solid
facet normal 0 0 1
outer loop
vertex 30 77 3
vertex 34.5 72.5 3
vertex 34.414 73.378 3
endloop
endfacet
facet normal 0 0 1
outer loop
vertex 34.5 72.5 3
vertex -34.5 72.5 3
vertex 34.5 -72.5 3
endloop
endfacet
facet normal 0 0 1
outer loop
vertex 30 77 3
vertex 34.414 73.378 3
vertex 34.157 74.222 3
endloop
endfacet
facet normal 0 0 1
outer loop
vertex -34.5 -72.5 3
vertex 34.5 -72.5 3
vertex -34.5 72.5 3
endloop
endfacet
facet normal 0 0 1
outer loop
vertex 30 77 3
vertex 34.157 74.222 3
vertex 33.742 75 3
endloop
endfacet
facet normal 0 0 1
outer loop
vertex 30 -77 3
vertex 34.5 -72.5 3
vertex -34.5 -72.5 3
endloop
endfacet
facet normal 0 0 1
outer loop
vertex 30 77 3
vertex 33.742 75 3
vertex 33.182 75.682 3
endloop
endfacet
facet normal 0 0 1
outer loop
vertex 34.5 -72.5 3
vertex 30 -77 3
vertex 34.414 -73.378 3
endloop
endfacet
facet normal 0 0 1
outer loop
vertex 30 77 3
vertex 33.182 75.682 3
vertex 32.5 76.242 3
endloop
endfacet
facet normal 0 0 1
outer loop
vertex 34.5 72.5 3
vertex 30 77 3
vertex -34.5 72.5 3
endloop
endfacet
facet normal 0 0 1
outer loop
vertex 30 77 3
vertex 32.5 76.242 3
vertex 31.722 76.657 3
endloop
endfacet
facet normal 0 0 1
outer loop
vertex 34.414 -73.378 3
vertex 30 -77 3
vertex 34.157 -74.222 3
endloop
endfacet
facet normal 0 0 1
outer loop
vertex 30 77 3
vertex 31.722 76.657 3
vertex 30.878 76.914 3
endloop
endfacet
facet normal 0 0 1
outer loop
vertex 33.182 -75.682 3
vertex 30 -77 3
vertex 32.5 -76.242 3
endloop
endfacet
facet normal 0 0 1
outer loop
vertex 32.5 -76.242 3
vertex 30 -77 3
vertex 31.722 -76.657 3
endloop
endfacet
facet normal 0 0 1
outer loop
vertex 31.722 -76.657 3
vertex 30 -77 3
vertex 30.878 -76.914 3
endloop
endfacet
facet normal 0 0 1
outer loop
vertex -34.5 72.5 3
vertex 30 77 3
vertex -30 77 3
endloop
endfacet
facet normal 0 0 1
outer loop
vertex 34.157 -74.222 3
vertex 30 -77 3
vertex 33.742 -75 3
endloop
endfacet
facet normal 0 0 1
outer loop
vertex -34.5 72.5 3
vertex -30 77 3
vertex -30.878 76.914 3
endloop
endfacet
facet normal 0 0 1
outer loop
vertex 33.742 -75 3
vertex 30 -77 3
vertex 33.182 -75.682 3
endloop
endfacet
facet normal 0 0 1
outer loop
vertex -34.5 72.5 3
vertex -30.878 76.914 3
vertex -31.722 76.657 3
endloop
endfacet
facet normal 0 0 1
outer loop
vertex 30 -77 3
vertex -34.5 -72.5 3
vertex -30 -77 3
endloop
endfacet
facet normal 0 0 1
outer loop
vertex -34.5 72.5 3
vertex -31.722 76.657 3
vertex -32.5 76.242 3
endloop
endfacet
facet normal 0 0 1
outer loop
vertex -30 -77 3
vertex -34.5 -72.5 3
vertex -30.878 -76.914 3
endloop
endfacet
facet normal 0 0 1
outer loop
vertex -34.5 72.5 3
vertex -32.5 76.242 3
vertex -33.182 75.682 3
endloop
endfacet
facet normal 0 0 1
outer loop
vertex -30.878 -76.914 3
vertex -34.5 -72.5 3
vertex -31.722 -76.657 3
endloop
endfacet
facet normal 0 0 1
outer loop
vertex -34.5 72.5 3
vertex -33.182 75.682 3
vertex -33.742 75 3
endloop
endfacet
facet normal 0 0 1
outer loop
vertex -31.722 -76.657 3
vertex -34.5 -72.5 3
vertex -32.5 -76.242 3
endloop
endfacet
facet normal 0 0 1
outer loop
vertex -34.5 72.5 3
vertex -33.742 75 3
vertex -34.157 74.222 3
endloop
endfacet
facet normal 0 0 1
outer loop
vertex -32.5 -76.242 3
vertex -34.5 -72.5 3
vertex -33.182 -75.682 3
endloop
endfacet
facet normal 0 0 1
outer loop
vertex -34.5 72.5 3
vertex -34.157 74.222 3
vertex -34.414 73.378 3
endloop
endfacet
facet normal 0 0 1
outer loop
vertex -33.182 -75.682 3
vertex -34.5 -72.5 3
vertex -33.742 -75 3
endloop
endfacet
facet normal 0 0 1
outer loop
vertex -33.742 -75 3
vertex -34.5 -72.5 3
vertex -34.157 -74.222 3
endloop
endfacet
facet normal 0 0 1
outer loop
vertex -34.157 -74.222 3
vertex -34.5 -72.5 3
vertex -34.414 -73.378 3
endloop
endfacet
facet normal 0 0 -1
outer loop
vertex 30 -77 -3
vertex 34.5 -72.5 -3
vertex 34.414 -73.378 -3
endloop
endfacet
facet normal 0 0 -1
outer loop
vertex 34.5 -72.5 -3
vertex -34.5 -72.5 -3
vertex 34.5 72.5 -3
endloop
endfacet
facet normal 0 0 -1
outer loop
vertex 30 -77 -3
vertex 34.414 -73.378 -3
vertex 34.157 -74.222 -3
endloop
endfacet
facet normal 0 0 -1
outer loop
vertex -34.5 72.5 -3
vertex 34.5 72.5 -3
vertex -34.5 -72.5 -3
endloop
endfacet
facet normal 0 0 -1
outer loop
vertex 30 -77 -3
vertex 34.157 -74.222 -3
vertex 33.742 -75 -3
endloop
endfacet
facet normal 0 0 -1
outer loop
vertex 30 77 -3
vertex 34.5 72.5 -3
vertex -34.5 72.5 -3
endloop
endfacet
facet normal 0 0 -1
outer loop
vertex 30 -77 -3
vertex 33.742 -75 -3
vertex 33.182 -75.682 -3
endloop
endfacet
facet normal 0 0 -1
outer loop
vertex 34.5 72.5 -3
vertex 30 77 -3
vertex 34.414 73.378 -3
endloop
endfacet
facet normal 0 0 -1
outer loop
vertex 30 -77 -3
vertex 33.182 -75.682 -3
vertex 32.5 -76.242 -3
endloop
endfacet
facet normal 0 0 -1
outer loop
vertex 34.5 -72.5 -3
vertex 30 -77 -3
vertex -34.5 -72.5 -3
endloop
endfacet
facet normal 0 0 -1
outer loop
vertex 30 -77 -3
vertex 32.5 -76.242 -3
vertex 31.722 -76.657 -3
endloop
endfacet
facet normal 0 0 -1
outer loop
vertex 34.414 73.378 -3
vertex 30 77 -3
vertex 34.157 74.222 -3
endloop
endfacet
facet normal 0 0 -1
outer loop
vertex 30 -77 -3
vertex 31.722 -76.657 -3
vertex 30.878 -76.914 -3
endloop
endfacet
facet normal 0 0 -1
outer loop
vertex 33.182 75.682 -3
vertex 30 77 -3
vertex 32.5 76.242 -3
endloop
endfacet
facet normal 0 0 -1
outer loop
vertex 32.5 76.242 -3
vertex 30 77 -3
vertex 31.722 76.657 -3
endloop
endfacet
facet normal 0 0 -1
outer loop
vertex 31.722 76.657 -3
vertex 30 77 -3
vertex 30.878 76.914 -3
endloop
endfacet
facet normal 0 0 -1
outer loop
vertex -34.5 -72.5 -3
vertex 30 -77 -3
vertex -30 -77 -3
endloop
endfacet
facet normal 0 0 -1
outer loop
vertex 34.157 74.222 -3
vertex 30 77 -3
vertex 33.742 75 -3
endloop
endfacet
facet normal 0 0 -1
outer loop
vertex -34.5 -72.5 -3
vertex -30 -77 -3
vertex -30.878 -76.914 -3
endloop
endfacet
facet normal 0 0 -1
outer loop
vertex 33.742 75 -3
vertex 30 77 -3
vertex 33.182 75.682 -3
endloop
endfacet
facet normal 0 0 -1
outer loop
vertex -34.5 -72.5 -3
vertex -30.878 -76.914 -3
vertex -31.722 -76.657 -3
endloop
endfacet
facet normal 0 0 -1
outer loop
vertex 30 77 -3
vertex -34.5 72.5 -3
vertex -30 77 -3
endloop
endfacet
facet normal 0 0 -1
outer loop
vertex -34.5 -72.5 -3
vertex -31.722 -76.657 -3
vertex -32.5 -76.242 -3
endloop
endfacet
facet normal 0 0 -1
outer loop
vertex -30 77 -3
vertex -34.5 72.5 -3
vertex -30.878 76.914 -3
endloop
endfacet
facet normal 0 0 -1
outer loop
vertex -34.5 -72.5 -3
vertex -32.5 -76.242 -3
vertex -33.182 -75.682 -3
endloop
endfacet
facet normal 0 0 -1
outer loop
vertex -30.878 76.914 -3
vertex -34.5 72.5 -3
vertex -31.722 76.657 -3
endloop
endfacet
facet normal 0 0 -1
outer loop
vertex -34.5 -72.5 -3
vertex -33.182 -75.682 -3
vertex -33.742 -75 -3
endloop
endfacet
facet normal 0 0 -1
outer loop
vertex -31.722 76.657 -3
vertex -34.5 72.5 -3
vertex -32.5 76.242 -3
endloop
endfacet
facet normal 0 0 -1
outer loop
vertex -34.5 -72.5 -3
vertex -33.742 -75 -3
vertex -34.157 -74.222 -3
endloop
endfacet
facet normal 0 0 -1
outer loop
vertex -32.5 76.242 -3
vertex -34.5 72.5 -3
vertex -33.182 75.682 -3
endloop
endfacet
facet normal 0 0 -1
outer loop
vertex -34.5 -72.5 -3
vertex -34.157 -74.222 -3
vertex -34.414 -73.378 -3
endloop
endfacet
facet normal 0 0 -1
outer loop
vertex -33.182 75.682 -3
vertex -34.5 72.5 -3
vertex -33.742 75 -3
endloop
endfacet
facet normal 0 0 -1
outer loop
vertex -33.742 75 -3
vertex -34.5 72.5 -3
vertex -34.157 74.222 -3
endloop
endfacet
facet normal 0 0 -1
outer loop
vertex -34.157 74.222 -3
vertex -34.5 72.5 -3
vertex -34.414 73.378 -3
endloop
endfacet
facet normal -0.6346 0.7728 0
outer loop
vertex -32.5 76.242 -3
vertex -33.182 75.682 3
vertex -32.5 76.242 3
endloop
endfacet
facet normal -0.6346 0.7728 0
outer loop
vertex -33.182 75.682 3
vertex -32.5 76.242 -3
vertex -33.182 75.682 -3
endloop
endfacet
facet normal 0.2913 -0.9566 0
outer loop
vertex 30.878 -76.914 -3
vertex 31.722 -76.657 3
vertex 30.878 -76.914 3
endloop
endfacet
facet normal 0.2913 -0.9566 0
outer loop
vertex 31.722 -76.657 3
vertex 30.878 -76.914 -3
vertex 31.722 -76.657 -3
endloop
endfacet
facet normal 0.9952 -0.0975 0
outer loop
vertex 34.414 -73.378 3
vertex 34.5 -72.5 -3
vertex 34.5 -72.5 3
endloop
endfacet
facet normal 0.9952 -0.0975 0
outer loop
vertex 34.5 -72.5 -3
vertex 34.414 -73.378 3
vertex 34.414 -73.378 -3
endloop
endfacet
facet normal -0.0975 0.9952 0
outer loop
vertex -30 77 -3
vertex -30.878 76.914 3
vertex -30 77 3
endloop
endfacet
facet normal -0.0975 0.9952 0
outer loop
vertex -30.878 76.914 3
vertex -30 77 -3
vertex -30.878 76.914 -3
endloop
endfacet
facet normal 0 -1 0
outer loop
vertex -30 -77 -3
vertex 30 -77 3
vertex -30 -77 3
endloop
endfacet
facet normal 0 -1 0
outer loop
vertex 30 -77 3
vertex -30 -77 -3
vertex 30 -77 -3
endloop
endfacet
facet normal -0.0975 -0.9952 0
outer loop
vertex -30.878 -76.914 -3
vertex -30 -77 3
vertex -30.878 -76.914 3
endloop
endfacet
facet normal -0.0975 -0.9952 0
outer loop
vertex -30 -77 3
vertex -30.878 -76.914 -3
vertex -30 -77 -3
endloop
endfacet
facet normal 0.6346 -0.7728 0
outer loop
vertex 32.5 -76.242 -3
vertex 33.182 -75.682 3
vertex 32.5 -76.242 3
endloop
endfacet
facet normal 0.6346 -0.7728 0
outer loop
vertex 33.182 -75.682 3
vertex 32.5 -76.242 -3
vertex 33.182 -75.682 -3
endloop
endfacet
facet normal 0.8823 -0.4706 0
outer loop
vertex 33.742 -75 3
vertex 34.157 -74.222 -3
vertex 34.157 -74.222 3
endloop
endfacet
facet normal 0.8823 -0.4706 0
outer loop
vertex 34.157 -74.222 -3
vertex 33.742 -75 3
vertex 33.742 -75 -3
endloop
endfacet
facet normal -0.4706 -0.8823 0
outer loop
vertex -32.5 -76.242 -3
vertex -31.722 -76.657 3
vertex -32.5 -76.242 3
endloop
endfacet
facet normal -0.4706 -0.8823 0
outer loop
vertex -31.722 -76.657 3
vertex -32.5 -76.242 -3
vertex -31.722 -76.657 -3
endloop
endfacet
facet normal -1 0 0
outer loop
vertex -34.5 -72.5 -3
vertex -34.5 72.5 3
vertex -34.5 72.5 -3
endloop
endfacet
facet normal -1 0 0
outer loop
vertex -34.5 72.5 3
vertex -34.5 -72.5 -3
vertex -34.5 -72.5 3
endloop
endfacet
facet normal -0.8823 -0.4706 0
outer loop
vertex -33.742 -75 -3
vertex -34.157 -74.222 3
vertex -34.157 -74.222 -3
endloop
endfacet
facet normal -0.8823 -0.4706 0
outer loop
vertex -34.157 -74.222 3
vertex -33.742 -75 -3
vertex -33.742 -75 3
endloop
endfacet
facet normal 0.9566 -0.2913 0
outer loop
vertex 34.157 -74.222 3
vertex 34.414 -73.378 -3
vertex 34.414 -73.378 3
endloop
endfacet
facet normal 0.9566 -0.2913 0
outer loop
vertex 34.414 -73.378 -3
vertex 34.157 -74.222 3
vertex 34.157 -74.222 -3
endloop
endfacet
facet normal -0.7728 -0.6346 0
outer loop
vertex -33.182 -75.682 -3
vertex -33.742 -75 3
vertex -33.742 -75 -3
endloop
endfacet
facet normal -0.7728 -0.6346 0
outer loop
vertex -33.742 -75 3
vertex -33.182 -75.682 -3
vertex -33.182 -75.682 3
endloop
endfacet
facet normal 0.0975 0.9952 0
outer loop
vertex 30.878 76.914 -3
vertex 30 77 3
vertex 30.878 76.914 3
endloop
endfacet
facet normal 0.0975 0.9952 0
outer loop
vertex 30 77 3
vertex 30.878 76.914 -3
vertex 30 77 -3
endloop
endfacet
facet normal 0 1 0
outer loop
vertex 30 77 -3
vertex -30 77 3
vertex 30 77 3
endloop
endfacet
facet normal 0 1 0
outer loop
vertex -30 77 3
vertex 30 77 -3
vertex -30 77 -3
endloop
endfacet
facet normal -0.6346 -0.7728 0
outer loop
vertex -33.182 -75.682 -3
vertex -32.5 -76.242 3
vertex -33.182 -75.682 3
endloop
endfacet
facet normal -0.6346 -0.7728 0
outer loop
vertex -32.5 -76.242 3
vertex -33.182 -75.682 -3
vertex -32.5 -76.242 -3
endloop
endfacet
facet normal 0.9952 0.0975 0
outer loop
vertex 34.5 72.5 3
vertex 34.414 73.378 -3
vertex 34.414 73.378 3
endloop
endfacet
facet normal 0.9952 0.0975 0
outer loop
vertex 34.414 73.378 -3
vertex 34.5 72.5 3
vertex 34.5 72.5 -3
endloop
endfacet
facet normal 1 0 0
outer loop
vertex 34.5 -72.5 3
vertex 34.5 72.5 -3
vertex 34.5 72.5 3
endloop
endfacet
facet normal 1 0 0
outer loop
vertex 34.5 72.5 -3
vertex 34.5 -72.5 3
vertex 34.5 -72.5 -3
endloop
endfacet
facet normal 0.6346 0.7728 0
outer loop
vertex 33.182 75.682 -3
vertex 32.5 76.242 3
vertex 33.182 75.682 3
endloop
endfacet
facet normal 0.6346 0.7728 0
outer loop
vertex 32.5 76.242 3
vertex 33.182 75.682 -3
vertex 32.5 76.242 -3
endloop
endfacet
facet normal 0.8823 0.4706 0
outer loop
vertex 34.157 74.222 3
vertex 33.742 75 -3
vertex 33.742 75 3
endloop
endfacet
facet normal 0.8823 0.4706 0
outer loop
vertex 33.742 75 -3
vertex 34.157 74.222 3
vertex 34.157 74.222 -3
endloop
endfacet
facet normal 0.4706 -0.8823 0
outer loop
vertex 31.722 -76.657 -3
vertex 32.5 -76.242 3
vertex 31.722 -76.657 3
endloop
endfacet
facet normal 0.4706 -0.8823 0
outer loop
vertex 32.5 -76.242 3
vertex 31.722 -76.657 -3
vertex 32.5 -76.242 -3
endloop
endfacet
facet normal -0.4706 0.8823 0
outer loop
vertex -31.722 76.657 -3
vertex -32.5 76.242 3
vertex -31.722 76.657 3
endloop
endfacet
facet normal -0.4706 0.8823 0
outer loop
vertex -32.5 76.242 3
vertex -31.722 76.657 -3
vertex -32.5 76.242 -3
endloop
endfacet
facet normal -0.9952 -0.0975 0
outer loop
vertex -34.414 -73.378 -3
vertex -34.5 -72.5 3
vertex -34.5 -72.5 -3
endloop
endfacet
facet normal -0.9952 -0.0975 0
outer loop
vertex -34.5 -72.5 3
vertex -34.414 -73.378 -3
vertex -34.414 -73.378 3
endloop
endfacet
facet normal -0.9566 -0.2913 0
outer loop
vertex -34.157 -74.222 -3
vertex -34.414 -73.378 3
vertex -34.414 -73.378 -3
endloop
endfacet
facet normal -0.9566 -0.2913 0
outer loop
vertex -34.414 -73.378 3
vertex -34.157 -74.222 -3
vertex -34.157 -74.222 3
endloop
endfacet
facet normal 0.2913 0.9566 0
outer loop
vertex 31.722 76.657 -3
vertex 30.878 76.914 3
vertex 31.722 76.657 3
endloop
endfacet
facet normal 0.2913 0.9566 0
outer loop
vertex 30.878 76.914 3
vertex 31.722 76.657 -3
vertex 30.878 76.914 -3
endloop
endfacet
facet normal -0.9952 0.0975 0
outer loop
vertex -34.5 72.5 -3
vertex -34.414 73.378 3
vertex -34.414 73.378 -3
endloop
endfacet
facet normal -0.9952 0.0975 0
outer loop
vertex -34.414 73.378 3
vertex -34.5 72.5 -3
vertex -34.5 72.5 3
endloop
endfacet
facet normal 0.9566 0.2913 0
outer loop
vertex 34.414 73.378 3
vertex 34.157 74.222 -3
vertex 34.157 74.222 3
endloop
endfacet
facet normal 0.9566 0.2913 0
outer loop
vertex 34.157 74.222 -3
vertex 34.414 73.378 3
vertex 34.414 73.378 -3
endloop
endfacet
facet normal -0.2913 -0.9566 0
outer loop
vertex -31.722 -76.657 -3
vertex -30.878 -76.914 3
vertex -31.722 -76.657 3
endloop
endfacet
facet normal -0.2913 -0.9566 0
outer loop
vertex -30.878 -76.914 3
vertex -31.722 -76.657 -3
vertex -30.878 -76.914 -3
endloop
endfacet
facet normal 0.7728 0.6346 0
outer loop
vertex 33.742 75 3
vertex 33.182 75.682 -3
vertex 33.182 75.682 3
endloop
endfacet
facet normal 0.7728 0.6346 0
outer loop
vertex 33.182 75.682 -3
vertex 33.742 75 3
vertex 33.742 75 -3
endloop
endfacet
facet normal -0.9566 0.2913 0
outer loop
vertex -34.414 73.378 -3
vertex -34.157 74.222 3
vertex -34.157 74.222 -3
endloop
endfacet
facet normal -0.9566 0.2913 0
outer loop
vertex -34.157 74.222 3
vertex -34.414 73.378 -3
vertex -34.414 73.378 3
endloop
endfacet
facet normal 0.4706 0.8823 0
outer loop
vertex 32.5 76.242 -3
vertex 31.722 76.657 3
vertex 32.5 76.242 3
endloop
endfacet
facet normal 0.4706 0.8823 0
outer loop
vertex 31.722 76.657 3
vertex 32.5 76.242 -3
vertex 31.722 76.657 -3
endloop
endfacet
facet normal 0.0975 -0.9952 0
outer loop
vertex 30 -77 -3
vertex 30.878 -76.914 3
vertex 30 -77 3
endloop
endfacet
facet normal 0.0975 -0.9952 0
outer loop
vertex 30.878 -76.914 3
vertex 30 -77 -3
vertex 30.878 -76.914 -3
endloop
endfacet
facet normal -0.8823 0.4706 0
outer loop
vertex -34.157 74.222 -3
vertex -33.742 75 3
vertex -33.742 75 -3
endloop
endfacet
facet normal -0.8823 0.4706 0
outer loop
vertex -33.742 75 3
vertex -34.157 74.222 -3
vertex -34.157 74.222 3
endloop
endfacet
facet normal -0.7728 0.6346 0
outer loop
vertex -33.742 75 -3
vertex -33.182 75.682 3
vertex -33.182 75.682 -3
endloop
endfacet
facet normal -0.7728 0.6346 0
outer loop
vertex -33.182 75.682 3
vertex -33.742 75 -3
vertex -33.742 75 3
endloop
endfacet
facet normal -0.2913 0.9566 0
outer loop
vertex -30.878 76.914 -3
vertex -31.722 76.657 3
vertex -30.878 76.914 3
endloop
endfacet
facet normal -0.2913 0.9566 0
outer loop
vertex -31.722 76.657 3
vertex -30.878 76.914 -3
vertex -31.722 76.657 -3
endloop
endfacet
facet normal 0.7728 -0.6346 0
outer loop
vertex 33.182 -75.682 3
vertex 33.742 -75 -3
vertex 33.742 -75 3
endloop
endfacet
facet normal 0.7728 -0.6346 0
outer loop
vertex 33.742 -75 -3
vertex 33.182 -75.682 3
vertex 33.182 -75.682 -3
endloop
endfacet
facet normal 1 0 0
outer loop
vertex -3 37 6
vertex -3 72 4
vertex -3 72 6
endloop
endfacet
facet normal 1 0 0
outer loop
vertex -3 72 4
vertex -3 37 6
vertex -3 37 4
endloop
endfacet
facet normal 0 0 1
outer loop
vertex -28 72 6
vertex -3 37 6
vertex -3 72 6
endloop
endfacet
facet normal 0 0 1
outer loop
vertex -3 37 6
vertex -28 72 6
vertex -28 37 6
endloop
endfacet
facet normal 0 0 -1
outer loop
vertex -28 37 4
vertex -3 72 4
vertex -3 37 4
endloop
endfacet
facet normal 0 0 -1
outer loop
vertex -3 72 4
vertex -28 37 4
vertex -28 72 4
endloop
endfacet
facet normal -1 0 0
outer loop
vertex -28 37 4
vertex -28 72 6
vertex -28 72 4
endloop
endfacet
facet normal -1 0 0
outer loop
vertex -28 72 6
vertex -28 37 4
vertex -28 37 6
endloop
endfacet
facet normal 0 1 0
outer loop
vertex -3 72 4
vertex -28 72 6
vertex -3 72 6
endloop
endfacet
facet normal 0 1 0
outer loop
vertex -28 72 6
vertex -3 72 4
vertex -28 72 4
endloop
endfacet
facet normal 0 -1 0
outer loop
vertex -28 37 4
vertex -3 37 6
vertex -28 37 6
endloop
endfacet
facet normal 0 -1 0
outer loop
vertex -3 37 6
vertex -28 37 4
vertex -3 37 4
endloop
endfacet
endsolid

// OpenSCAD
echo("Работа Павла Семенова");
len_phone = 145;
width_phone = 60;
thickness_phone = 6;
cube([width_phone, len_phone, thickness_phone], center=true);

hull() {
    color("red")
    translate([width_phone/2, len_phone/2, 0])
    cylinder(h=thickness_phone, d=8, $fn=32, center=true);

    mirror([1,0,0])
    color("red")
    translate([width_phone/2, len_phone/2, 0])
    cylinder(h=thickness_phone, d=8, $fn=32, center=true);

    mirror([0,1,0])
    color("red")
    translate([width_phone/2, len_phone/2, 0])
    cylinder(h=thickness_phone, d=8, $fn=32, center=true);

    mirror([1,0,0])
    mirror([0,1,0])
    color("red")
    translate([width_phone/2, len_phone/2, 0])
    cylinder(h=thickness_phone, d=8, $fn=32, center=true);
}





echo("Работа Павла Семенова");
len_phone = 145;
width_phone = 60;
thickness_phone = 6;

corner_round = 9;

cube([width_phone, len_phone, thickness_phone], center=true);

module smartphone() {
    hull() {
        color("red")
        translate([width_phone/2, len_phone/2, 0])
        cylinder(h=thickness_phone, d=corner_round, $fn=32, center=true);

        mirror([1,0,0])
        color("red")
        translate([width_phone/2, len_phone/2, 0])
        cylinder(h=thickness_phone, d=corner_round, $fn=32, center=true);

        mirror([0,1,0])
        color("red")
        translate([width_phone/2, len_phone/2, 0])
        cylinder(h=thickness_phone, d=corner_round, $fn=32, center=true);

        mirror([1,0,0])
        mirror([0,1,0])
        color("red")
        translate([width_phone/2, len_phone/2, 0])
        cylinder(h=thickness_phone, d=corner_round, $fn=32, center=true);
    }
}


h = 3;

smartphone();
color("red")
translate([-28, 37, 4])
cube([25, 35, 2]);
